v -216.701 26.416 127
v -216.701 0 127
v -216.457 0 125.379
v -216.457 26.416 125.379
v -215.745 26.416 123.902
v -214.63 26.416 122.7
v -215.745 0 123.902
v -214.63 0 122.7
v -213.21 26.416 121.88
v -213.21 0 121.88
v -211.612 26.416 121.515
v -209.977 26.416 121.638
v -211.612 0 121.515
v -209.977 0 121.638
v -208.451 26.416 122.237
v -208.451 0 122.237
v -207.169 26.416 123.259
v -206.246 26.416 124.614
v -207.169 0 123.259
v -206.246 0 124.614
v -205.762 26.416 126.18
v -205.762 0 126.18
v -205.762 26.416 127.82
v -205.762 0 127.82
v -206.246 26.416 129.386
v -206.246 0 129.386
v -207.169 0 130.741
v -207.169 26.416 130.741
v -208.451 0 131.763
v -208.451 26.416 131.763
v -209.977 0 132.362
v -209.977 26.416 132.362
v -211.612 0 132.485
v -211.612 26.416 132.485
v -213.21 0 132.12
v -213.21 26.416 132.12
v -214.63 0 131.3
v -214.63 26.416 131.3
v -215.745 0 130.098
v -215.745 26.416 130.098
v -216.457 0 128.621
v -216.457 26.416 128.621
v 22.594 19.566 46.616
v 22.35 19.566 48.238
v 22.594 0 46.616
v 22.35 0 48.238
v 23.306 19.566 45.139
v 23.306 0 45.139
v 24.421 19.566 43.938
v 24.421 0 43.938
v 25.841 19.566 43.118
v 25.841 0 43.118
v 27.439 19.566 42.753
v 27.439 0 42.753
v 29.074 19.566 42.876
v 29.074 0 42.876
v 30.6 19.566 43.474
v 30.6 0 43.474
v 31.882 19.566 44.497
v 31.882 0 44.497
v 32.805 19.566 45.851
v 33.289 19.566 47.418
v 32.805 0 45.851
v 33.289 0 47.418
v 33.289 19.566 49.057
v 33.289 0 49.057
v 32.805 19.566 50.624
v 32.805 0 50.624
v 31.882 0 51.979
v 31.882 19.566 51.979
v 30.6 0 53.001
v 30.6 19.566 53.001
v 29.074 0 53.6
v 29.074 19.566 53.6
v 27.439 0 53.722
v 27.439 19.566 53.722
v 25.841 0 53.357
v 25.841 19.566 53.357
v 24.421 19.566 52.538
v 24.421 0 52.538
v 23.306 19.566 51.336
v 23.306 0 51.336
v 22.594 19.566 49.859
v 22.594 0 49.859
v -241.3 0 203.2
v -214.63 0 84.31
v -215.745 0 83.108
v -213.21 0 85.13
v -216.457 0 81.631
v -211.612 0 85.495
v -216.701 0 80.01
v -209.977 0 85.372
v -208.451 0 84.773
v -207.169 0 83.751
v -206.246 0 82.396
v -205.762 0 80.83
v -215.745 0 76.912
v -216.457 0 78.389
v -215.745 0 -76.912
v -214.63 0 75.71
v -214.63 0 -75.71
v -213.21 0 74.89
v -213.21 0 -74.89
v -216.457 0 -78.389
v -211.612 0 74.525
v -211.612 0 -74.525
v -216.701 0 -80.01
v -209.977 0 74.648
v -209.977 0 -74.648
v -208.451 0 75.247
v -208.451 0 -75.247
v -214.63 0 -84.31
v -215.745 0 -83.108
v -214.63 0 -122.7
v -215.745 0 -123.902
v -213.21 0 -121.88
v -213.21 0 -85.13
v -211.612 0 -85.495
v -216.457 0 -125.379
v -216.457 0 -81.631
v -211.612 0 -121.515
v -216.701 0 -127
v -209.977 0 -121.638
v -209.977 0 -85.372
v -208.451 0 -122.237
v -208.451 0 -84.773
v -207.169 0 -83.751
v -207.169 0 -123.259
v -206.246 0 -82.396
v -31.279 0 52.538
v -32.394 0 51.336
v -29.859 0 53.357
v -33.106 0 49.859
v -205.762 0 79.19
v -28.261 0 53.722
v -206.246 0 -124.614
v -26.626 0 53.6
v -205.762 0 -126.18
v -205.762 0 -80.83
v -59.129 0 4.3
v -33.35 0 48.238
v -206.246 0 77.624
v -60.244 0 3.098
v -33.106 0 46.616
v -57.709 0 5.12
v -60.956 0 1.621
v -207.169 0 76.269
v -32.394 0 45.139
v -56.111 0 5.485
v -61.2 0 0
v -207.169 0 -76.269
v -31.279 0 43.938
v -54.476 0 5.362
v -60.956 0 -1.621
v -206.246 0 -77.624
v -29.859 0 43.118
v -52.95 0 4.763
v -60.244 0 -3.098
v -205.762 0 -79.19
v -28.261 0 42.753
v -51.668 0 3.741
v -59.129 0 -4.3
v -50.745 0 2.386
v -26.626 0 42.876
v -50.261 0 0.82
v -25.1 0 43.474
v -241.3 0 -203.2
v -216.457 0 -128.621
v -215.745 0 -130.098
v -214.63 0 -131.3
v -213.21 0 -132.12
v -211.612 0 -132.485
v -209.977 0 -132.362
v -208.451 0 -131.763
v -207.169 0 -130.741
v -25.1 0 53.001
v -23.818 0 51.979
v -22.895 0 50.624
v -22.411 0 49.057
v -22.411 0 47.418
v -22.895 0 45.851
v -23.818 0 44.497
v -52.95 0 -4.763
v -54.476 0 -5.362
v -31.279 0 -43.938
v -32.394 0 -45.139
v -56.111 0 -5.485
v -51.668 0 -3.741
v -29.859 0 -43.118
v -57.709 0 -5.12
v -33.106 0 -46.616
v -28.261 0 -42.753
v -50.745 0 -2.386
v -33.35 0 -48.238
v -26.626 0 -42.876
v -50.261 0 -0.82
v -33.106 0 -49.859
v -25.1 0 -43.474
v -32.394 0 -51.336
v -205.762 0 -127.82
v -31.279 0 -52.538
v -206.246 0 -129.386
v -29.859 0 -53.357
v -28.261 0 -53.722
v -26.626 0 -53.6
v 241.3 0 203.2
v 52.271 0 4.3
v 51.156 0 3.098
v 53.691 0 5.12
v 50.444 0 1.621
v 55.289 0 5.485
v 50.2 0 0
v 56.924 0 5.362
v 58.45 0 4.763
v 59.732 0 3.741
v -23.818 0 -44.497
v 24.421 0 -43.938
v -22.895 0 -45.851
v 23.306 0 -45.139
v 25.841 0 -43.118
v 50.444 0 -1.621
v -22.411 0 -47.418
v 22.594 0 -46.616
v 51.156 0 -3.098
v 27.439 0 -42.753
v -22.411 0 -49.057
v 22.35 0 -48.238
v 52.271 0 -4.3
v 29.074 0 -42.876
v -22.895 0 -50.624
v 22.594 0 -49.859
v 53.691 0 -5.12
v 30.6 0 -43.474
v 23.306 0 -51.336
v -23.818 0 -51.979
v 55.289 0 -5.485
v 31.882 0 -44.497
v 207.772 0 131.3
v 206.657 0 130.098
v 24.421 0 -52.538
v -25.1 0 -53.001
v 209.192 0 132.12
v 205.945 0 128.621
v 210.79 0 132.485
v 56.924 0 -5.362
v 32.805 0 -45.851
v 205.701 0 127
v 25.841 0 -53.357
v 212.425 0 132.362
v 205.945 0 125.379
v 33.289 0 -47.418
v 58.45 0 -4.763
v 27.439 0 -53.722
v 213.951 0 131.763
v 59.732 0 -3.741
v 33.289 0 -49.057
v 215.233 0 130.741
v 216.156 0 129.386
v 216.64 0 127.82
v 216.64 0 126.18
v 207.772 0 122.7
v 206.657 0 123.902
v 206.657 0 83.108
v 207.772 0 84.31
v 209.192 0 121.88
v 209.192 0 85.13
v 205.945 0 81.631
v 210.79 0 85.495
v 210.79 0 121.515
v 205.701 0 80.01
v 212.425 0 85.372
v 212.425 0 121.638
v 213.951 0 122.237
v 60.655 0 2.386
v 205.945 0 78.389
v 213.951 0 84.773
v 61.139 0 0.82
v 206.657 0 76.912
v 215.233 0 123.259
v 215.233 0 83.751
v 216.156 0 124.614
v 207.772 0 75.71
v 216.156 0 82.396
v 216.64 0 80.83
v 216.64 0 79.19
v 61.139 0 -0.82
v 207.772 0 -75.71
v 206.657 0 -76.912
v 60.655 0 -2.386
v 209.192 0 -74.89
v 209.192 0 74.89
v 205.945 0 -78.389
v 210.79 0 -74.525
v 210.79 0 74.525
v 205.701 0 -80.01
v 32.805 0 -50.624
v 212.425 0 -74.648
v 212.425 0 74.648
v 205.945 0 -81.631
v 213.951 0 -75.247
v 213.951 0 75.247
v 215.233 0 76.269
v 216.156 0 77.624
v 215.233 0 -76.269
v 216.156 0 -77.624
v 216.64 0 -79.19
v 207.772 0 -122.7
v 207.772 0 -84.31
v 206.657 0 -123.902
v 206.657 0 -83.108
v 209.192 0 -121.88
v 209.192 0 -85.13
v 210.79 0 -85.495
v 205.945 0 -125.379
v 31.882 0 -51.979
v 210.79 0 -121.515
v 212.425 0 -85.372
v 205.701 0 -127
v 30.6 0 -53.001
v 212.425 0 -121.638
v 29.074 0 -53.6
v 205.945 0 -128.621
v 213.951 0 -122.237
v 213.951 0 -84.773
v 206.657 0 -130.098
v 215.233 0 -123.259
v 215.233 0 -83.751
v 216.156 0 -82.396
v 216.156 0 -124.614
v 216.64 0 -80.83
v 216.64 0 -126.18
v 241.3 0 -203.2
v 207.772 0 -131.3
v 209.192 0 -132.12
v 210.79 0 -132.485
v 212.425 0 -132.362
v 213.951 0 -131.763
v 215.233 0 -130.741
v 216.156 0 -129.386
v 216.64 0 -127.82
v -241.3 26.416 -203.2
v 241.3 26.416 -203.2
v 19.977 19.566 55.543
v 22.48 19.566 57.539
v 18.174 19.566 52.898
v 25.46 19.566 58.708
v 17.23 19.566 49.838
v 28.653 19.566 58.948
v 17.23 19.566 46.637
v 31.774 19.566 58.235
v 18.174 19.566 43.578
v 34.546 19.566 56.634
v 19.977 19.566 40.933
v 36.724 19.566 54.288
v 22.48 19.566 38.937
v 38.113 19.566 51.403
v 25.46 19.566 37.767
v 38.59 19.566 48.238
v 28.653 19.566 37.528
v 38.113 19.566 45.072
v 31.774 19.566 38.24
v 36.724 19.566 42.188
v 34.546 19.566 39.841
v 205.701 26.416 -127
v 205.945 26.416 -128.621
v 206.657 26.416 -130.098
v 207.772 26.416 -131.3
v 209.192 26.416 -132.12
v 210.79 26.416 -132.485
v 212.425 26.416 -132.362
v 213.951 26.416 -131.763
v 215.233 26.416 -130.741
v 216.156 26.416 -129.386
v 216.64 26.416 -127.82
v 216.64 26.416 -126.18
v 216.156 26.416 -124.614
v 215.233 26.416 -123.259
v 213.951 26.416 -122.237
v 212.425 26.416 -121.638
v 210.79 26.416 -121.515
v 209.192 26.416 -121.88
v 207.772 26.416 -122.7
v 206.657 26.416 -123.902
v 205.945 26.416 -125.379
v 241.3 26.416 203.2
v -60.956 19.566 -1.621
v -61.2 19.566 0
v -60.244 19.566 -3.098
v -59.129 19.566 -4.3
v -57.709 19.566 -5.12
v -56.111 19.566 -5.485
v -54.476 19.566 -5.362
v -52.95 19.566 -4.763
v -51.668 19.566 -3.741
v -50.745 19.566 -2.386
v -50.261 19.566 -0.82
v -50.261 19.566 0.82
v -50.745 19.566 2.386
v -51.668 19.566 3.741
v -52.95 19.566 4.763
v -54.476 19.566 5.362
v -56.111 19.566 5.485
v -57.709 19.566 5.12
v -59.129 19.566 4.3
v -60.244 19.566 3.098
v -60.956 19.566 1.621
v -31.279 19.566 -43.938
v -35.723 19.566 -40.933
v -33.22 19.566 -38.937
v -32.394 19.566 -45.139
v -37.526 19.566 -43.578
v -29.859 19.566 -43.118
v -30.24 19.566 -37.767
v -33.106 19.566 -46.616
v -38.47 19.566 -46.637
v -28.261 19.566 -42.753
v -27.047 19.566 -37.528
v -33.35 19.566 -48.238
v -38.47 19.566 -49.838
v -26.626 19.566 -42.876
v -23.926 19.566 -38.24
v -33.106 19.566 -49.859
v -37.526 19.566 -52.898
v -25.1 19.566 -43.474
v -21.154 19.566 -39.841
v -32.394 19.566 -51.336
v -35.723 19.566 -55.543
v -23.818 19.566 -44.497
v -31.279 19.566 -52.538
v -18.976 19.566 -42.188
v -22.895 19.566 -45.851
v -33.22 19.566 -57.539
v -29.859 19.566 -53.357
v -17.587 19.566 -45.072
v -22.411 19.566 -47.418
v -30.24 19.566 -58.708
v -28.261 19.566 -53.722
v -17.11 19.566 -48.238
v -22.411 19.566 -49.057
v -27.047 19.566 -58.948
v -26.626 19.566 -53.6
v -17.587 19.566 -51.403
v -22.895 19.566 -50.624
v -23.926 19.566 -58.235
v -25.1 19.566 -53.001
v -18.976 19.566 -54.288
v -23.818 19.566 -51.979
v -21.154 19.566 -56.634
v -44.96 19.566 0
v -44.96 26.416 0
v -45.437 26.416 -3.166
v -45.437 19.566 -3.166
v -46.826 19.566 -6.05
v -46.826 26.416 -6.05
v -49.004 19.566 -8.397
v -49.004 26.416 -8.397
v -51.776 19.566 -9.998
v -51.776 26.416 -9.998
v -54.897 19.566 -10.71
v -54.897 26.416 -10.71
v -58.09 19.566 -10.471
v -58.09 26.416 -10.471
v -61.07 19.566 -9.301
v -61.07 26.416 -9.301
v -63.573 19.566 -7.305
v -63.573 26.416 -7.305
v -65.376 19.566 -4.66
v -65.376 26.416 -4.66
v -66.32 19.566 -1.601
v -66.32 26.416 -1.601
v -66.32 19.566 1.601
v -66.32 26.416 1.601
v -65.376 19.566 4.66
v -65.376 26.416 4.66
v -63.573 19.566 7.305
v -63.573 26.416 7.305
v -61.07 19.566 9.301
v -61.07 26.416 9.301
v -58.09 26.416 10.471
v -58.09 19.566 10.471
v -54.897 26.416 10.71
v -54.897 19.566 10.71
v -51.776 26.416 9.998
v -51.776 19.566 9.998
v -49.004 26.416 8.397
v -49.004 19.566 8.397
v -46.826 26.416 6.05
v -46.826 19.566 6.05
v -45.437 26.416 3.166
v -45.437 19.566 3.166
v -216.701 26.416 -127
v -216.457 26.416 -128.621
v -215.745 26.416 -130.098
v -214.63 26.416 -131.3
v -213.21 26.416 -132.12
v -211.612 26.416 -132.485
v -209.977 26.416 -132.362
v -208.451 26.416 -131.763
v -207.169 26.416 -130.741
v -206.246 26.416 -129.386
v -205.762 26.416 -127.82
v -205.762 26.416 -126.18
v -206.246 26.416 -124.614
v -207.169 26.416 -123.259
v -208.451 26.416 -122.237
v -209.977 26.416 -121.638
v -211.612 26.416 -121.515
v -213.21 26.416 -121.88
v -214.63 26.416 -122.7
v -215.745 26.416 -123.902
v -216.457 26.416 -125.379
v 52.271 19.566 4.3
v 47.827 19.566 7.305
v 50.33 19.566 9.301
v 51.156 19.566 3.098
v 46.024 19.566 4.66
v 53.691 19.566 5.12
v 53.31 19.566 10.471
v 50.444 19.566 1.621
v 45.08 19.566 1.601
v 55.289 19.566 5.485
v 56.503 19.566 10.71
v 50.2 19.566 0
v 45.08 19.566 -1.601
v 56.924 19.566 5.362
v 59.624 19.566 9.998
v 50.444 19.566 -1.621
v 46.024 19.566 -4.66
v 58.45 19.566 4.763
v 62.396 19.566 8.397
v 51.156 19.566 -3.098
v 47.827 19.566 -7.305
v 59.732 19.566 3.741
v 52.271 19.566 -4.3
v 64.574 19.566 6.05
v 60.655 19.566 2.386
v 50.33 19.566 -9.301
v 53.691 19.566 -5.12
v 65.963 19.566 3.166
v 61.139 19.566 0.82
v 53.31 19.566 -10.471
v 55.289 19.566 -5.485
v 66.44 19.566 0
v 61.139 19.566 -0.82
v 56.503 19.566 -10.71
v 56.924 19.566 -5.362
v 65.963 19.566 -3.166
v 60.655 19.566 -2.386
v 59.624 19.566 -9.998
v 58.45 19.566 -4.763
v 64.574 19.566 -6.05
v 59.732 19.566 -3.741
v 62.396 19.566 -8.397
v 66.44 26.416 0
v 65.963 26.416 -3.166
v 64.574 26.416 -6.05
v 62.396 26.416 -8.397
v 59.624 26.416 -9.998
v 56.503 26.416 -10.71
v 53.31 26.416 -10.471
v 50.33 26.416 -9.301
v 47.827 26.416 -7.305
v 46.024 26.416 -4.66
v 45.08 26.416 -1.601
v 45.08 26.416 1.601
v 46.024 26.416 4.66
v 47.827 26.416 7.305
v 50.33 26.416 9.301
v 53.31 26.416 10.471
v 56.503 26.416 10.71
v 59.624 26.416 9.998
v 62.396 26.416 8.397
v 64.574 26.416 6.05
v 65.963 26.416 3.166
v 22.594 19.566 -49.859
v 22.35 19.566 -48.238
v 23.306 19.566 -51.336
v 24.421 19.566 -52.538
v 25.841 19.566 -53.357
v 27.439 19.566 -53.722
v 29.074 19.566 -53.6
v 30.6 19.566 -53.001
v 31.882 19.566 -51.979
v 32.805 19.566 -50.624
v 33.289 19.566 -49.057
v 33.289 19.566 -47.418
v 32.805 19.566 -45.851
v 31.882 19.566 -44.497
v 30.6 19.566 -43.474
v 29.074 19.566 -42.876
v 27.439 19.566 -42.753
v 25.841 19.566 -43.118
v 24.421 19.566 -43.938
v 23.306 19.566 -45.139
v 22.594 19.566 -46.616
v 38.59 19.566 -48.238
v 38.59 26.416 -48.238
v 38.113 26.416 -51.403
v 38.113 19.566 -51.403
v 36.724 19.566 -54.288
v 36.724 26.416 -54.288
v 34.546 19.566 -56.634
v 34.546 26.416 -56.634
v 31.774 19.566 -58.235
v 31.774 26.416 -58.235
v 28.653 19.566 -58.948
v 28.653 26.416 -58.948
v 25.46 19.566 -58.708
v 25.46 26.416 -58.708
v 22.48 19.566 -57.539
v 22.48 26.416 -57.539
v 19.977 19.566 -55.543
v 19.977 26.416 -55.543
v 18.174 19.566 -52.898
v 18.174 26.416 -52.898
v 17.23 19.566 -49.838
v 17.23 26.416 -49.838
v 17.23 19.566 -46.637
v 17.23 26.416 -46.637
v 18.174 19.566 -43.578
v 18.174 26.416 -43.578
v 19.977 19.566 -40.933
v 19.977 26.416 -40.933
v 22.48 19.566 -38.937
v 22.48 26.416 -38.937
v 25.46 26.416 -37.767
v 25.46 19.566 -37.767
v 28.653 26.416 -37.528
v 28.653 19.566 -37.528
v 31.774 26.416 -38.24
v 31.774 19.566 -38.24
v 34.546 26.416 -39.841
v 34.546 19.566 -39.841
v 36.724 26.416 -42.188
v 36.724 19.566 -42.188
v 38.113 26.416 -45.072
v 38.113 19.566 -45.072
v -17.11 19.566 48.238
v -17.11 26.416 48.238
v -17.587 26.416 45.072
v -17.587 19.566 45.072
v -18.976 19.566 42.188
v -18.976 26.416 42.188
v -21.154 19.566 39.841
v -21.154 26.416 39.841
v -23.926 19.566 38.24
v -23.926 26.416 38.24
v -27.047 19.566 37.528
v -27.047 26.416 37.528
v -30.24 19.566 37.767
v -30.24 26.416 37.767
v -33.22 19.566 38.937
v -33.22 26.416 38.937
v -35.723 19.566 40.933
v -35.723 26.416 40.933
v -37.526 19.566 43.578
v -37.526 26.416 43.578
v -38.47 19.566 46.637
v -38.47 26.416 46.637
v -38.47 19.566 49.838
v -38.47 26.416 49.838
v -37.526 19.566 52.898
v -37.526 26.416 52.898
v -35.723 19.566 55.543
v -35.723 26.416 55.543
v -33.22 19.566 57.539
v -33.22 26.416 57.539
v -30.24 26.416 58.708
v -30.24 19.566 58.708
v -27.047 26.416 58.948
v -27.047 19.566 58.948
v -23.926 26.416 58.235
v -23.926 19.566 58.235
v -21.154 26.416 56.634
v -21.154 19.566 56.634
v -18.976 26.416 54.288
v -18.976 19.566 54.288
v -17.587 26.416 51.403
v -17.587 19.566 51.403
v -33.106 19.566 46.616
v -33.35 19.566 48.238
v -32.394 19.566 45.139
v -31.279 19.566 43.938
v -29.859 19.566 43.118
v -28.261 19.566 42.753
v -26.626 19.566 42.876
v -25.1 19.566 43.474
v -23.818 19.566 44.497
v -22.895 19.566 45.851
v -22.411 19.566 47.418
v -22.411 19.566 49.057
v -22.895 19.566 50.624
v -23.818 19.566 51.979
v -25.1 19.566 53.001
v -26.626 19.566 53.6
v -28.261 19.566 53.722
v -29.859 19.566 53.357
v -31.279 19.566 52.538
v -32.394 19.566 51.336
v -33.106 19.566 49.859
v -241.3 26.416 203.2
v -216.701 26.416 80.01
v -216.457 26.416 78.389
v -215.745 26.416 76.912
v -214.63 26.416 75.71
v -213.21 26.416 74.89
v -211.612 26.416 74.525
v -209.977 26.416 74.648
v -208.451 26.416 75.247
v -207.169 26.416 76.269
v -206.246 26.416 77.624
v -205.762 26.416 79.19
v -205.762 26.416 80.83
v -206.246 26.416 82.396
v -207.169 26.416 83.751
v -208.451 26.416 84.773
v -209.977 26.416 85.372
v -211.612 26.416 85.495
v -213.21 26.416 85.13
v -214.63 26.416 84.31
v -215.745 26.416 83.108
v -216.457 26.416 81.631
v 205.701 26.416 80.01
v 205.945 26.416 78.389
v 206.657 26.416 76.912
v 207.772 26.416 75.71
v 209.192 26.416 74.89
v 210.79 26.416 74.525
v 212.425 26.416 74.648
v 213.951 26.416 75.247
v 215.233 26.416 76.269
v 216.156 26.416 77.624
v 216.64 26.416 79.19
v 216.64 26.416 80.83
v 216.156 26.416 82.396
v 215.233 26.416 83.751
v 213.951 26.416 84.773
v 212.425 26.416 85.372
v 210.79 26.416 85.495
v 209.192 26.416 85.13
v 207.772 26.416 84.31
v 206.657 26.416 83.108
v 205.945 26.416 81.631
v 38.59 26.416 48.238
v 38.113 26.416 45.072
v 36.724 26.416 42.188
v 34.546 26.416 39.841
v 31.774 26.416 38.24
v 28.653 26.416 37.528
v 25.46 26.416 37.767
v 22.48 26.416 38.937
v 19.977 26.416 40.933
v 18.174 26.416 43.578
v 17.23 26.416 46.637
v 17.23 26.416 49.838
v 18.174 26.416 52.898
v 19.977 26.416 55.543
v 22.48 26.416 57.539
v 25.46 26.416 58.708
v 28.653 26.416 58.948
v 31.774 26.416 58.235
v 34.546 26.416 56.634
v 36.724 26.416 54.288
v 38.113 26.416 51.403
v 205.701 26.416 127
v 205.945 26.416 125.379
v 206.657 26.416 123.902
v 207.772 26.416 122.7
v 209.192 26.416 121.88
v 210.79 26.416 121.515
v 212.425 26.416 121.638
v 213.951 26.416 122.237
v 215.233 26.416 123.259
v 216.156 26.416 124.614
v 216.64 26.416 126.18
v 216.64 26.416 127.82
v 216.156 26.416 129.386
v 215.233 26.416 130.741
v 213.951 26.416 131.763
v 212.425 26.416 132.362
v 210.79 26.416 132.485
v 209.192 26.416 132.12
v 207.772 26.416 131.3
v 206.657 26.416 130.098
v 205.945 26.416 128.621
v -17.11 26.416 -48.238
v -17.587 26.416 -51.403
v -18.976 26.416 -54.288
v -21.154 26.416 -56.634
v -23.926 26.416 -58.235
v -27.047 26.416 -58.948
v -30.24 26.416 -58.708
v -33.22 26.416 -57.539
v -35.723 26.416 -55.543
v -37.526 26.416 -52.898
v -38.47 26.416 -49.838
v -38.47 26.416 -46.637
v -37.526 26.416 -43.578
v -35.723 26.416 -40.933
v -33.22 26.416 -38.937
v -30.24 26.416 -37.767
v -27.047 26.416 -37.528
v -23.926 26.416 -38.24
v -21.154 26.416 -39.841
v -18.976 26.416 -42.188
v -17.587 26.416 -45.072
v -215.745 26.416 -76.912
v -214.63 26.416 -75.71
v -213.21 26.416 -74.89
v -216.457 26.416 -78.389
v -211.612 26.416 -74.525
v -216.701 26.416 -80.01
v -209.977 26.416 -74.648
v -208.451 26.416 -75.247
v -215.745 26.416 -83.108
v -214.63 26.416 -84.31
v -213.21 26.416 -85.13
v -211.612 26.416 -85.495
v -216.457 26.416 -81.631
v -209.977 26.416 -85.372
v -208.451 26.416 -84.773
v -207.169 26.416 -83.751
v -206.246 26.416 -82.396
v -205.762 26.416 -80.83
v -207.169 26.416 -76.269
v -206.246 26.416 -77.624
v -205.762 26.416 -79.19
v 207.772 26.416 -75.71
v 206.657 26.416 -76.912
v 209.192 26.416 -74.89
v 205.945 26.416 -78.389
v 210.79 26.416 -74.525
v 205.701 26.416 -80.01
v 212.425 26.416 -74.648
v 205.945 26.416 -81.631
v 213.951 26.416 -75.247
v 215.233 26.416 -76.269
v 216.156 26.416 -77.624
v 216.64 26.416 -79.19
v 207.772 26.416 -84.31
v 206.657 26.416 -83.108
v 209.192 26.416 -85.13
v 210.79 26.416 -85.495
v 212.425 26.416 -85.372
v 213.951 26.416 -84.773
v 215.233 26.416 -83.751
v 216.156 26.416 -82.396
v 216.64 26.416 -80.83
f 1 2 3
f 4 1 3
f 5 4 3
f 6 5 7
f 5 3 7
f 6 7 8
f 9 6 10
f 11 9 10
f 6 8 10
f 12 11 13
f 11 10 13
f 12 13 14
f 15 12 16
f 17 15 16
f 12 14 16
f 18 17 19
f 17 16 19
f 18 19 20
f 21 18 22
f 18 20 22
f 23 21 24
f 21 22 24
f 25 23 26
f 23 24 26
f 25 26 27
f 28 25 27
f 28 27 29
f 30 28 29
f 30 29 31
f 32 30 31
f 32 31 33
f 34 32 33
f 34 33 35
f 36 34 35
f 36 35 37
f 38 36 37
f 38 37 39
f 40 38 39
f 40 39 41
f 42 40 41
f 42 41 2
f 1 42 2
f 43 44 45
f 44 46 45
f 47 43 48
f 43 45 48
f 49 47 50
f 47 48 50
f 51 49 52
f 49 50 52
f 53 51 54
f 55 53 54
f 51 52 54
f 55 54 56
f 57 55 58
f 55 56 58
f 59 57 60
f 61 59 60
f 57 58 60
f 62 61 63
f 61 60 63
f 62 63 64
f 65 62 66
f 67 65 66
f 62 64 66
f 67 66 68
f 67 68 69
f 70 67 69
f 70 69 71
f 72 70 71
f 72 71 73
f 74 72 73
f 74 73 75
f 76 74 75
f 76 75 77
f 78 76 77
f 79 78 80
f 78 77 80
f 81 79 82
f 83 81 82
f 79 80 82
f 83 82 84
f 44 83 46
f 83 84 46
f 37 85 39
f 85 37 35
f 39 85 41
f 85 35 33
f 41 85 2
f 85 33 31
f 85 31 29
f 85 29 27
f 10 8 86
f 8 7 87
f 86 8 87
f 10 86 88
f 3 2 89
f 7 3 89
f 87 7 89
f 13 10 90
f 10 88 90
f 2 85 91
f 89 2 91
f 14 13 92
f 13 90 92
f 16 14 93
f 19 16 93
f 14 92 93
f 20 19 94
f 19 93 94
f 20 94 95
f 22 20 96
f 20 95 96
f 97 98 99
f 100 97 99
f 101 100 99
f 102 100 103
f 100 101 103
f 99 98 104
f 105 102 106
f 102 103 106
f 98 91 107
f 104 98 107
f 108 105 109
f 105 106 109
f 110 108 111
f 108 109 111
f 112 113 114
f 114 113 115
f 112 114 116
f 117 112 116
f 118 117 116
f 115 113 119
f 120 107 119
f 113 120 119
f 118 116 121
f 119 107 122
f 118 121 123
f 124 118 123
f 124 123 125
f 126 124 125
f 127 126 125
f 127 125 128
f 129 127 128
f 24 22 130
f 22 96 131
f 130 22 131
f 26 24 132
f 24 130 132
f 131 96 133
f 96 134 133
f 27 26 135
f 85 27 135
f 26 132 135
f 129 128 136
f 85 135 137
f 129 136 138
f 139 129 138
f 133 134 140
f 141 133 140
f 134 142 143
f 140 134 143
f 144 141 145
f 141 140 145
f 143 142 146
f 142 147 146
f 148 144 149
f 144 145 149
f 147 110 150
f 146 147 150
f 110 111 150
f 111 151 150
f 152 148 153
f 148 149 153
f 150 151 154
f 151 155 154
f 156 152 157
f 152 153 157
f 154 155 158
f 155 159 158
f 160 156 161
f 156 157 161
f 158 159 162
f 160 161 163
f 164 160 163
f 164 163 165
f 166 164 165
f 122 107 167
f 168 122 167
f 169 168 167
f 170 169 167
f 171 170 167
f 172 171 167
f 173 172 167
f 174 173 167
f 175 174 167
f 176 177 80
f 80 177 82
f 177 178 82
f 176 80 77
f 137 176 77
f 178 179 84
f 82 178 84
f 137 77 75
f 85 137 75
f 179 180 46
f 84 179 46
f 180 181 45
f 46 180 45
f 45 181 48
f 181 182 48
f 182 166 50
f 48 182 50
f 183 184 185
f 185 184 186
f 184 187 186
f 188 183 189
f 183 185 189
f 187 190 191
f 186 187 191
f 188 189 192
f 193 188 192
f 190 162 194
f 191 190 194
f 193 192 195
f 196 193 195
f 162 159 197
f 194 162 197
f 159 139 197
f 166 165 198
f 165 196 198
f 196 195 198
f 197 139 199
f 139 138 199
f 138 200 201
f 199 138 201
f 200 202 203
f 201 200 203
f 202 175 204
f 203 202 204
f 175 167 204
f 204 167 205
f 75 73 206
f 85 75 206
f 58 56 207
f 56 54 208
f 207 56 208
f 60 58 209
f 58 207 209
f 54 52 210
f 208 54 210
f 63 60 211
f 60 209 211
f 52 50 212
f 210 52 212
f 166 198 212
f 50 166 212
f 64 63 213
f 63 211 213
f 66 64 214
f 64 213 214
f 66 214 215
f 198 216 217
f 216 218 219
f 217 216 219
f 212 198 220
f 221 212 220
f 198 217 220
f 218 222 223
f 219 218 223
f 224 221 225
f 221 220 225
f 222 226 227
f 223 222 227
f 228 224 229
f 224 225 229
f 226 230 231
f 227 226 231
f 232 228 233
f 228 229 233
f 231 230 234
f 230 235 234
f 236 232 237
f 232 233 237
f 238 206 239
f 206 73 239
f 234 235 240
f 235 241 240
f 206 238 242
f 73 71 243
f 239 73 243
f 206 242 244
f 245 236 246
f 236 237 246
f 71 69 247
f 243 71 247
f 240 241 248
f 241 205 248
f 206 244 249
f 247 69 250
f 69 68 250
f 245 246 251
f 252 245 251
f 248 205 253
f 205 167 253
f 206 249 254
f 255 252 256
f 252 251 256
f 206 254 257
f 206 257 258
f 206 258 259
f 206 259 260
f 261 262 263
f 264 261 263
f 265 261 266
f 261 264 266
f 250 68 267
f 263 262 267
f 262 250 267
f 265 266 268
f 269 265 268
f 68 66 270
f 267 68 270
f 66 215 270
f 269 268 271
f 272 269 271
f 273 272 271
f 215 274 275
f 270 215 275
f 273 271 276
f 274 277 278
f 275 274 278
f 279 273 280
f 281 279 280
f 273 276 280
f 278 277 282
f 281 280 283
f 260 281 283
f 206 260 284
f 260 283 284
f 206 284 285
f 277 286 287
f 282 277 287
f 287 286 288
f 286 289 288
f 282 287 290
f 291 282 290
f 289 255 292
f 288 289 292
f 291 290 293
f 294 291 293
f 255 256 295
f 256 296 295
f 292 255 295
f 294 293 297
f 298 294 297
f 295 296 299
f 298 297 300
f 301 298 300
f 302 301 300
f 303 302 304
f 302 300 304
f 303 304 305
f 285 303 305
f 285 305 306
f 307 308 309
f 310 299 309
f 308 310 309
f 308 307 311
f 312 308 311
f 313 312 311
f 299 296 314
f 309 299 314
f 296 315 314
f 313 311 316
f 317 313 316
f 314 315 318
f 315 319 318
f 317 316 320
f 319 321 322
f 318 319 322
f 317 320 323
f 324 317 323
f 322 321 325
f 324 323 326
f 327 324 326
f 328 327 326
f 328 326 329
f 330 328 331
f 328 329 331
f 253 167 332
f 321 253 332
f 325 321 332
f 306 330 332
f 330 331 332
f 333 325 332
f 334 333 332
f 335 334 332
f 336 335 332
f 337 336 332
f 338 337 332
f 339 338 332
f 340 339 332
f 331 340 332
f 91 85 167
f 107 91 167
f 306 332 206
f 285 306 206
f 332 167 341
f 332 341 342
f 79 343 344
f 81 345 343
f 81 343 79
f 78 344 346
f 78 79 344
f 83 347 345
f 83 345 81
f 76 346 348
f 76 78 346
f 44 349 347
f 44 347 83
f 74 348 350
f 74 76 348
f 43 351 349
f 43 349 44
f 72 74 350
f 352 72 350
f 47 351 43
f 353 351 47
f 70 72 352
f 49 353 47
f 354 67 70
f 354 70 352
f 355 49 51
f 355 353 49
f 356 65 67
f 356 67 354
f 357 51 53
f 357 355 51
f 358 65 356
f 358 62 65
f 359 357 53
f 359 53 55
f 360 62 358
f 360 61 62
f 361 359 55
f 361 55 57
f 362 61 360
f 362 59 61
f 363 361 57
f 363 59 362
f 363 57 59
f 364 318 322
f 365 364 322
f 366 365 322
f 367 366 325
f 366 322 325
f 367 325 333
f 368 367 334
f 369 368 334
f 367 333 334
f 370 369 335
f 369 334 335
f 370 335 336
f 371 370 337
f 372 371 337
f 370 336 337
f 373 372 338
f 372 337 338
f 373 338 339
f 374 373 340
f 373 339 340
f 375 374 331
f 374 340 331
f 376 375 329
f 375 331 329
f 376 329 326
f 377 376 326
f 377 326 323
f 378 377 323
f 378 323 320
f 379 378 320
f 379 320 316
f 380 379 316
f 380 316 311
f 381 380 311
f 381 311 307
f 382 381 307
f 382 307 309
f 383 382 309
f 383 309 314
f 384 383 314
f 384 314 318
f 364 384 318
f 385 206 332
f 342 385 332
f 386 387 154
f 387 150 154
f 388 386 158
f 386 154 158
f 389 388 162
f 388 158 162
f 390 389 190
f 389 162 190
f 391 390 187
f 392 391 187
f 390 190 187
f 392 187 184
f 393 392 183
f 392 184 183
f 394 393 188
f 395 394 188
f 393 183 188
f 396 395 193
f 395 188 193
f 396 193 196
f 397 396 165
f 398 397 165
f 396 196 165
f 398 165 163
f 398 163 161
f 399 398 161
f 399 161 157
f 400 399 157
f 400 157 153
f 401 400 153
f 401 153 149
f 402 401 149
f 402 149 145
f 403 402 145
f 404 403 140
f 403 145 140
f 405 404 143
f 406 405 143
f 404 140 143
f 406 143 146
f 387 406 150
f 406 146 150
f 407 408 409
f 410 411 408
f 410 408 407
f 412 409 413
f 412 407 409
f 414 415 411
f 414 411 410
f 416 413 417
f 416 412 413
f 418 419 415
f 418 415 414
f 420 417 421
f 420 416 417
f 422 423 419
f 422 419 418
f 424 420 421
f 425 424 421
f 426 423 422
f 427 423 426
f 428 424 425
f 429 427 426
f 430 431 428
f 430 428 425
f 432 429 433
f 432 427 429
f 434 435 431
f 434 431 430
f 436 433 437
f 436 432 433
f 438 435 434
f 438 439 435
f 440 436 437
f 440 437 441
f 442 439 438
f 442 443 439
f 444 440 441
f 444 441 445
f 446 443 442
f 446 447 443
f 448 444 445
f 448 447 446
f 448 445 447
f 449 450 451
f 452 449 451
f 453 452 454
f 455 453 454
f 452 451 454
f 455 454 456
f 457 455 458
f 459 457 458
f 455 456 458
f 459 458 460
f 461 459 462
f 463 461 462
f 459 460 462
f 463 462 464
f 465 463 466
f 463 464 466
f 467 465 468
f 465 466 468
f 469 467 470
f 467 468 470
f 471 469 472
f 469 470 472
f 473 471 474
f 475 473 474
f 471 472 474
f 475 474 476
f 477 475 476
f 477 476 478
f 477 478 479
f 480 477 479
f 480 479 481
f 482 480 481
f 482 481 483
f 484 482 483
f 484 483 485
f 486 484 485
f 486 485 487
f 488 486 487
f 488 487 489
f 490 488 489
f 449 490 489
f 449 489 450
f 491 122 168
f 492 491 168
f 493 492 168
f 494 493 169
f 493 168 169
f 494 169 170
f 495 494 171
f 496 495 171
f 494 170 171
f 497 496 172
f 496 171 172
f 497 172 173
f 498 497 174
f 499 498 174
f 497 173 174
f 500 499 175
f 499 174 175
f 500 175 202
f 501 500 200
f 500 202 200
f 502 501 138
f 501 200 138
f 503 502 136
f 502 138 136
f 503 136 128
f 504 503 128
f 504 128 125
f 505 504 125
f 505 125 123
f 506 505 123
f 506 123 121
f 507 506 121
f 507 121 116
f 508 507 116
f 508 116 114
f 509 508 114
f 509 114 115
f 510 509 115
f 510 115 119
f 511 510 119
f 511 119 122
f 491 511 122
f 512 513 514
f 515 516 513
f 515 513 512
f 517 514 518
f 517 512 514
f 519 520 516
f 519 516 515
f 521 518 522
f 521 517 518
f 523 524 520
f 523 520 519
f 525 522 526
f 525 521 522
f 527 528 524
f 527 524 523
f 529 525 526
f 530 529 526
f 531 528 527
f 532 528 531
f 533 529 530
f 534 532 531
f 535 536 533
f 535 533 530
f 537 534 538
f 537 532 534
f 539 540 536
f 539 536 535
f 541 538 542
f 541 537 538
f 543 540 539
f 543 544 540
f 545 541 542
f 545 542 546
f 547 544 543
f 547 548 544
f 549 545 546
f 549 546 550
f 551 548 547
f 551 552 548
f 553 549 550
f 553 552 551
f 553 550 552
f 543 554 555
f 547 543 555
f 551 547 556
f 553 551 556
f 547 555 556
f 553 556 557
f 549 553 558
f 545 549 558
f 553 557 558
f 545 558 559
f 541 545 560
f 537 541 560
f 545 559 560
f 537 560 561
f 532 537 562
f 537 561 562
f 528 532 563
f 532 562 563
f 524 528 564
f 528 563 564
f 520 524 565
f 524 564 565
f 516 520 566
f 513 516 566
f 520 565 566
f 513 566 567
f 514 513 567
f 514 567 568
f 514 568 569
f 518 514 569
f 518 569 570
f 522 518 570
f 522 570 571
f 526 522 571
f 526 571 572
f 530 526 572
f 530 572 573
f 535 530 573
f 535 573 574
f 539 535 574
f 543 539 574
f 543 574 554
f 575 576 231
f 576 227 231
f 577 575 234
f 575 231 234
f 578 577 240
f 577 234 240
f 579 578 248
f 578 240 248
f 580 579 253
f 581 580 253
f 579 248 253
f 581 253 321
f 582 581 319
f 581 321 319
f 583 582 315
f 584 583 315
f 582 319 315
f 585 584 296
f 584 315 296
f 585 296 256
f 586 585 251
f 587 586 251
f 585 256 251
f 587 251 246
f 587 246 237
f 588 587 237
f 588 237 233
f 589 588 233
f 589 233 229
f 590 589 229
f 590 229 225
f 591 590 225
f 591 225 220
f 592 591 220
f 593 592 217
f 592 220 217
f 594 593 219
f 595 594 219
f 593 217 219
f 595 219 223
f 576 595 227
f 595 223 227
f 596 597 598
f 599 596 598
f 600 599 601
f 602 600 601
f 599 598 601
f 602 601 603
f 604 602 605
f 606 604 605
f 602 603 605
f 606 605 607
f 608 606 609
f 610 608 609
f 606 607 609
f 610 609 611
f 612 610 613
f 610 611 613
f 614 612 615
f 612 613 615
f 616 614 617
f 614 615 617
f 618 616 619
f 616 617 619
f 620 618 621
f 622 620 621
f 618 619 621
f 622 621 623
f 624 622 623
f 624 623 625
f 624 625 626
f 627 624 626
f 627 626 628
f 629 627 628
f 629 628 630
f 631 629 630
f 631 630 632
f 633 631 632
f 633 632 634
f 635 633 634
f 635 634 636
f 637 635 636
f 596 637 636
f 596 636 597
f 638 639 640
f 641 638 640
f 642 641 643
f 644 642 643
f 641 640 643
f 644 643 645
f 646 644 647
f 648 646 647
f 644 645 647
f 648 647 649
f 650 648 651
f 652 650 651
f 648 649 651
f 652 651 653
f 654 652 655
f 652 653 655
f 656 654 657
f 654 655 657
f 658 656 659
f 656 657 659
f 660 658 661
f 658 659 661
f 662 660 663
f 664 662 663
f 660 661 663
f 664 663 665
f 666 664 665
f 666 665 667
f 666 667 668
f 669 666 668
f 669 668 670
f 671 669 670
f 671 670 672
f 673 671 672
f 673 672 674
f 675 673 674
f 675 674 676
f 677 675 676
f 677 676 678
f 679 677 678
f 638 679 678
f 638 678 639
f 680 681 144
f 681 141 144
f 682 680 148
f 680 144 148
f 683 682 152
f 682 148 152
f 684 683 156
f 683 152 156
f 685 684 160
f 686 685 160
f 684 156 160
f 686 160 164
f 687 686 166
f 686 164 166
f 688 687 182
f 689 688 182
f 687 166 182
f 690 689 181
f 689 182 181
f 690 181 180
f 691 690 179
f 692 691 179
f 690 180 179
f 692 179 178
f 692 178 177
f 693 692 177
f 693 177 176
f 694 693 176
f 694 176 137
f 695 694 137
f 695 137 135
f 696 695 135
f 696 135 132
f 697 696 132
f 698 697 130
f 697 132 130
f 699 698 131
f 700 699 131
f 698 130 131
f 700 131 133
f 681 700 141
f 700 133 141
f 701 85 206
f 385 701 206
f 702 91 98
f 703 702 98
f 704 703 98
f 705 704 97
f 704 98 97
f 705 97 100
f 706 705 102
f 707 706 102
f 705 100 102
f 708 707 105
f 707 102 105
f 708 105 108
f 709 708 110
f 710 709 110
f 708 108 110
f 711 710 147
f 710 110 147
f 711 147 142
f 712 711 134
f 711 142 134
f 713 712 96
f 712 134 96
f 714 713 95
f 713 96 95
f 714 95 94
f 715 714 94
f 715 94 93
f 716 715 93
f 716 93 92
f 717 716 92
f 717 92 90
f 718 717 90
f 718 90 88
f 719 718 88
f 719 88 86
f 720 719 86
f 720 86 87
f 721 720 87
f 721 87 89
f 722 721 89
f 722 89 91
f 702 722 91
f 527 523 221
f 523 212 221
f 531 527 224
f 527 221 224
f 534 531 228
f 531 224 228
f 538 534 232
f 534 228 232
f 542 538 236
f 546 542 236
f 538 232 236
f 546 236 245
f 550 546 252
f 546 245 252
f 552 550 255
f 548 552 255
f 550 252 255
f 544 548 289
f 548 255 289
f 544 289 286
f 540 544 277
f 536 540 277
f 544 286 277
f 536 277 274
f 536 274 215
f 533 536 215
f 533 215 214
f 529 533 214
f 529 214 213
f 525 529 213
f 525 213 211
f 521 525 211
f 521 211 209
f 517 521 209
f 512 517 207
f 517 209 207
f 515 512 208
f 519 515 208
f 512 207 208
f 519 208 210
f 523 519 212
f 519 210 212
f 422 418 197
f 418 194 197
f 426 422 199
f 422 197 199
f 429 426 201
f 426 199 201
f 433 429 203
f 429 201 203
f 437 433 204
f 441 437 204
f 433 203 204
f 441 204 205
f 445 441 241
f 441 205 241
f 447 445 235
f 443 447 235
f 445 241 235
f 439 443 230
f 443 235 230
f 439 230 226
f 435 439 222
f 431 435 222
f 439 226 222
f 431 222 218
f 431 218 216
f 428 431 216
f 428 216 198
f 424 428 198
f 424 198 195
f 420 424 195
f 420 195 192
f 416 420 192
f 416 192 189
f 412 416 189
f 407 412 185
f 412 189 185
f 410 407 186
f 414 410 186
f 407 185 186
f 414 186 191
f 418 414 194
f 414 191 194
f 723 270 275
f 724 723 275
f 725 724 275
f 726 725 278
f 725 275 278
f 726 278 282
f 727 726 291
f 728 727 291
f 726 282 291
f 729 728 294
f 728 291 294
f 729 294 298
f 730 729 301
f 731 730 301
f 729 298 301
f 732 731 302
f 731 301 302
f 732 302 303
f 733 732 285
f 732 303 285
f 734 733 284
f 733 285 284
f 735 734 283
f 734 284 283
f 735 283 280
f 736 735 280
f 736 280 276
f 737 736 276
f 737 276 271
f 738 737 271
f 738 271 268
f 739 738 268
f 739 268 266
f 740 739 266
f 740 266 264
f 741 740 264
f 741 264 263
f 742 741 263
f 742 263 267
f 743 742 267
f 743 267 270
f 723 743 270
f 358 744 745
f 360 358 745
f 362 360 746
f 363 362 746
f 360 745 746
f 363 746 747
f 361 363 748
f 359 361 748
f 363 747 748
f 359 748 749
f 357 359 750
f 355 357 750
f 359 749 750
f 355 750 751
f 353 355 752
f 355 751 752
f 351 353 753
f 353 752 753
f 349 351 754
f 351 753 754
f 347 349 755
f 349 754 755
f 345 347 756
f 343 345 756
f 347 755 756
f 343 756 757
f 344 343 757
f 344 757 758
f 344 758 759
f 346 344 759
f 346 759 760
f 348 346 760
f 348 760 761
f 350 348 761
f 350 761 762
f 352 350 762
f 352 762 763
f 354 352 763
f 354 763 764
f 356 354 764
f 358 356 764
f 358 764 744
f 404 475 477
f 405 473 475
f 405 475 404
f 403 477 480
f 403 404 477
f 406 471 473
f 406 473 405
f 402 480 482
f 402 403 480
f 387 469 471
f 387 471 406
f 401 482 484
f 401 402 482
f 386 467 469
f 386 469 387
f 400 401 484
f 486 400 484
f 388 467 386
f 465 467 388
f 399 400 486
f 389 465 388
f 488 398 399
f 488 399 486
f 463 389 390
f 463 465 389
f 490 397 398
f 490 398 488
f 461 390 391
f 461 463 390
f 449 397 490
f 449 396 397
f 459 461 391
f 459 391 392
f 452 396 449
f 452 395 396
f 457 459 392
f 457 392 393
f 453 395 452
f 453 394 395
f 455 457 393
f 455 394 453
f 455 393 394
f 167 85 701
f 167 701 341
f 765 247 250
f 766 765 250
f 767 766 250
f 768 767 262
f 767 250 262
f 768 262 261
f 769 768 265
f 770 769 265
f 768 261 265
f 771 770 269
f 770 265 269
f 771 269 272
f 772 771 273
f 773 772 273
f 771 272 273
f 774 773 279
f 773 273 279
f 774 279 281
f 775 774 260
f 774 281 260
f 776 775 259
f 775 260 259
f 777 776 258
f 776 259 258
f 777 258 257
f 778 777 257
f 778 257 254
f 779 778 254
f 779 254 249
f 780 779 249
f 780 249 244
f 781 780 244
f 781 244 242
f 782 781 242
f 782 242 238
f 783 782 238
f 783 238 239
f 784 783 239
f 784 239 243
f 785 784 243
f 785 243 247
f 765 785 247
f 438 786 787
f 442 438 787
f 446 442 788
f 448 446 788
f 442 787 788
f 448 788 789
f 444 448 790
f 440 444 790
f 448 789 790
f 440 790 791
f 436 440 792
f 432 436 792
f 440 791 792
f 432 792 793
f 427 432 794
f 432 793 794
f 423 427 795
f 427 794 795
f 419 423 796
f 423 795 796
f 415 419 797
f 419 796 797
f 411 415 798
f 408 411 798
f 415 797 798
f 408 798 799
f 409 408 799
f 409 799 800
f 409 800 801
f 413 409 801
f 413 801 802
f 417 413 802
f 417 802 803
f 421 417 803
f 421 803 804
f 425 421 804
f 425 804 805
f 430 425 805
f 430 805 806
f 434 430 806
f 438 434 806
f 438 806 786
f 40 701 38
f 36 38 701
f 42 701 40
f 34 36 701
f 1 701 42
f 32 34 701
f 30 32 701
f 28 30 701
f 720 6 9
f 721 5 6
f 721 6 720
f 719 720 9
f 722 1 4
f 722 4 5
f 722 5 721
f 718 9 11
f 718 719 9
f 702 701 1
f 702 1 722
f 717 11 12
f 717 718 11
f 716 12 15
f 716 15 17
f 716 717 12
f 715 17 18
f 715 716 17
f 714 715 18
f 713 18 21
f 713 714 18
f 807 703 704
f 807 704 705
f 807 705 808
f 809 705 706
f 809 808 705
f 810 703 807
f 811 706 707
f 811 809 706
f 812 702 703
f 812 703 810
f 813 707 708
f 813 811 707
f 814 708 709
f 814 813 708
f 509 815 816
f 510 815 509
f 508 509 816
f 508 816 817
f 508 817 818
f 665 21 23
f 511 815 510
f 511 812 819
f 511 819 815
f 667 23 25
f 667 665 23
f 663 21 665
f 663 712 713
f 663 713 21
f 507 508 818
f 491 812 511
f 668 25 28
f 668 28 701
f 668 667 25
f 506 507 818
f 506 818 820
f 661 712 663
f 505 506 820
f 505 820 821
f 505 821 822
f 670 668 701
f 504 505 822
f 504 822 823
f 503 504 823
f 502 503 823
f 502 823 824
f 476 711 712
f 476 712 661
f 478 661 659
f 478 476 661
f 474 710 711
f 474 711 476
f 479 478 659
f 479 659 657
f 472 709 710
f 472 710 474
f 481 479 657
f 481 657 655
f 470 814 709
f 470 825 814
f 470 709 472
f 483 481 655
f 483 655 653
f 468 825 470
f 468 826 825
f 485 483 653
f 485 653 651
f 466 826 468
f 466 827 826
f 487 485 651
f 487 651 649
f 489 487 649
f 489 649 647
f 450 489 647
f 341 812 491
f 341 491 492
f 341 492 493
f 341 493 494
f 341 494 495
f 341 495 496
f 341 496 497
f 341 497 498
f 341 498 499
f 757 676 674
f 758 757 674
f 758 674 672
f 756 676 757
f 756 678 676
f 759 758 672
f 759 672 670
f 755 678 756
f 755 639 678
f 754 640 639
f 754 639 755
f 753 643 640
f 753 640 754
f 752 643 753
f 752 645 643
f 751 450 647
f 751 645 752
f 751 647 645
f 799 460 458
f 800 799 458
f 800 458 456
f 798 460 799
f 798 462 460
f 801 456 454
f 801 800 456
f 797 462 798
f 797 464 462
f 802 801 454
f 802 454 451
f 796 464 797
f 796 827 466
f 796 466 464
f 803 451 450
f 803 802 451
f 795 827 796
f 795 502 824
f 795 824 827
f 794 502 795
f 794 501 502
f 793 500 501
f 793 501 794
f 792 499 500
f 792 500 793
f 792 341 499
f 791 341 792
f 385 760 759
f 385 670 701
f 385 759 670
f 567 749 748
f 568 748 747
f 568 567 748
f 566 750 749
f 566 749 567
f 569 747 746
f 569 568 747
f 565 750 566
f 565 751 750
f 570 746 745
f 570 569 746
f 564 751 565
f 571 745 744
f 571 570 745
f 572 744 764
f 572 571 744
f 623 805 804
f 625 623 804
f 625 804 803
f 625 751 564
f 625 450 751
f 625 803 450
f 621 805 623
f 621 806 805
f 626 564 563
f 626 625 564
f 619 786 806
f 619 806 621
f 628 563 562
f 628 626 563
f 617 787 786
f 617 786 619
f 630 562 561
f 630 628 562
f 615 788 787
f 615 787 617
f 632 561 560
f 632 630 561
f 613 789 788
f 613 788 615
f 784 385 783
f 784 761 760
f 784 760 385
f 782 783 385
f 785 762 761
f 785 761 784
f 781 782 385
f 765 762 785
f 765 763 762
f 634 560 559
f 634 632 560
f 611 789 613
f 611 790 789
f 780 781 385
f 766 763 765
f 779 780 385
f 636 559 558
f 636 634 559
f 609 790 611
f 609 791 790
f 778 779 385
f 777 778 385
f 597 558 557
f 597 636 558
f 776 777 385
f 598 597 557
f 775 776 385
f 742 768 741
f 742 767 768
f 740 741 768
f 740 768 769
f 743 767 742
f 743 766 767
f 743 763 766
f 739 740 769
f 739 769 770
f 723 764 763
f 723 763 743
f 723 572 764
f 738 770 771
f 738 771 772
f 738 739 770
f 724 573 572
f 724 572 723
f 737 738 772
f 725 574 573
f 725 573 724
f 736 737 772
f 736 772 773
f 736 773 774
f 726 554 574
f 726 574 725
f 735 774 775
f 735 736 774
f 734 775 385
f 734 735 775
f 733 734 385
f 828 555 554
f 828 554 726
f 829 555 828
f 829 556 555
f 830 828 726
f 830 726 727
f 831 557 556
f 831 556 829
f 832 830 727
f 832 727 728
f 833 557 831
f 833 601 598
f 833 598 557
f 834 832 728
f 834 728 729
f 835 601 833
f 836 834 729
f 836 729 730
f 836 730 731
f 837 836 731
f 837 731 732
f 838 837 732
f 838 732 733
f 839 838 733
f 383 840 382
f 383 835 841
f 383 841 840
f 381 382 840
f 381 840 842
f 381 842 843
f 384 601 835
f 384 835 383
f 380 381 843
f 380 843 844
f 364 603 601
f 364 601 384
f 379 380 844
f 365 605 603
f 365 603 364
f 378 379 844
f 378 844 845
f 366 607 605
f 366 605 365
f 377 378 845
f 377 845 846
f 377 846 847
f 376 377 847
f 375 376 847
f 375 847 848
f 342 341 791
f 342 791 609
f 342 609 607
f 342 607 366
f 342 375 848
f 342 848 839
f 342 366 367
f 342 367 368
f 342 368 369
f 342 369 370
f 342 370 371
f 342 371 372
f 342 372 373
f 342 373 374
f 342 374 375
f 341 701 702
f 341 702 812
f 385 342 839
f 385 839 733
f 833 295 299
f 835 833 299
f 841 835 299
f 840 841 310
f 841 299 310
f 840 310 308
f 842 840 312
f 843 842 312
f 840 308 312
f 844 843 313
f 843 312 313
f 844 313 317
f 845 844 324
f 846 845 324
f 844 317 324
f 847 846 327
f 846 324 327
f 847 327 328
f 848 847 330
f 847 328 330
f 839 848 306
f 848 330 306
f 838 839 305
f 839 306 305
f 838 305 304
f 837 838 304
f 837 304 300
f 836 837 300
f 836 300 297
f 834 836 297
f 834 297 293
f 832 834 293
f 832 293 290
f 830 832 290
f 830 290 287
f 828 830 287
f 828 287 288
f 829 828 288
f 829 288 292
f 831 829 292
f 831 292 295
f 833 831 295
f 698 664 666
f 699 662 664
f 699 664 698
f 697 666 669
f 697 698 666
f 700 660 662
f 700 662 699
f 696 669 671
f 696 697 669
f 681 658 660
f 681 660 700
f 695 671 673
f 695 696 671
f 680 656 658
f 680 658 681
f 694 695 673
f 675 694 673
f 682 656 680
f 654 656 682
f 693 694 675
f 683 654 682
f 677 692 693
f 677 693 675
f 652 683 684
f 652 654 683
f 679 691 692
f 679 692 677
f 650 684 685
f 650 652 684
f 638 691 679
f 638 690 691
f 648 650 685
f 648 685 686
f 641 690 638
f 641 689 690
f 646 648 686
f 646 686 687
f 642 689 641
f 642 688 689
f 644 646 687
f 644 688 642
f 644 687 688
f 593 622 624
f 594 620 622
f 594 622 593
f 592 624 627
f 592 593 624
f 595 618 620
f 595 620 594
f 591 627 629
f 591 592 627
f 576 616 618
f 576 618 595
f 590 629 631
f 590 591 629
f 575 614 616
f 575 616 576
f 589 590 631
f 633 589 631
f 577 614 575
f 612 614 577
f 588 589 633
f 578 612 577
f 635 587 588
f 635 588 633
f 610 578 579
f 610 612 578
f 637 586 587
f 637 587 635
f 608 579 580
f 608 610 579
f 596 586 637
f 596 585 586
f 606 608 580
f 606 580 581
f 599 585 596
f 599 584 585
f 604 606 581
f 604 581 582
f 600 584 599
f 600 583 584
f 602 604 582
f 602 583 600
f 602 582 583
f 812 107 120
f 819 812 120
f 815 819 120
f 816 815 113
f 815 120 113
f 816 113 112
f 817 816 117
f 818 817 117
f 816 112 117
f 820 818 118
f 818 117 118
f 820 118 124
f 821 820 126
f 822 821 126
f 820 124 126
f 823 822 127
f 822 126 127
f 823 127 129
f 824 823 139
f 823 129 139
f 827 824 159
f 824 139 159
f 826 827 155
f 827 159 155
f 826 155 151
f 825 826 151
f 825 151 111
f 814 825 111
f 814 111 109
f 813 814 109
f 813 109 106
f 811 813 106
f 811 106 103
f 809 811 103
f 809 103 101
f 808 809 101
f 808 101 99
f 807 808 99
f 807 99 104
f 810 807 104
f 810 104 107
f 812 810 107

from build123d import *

# Parameters (mm, degrees)
SKETCH1_W                                = 482.6
SKETCH1_H                                = 406.4
BOSS_EXTRUDE1_DEPTH                      = 26.416
SKETCH3_R                                = 1.27
SKETCH3_R_2                              = 5.25
CUT_EXTRUDE2_DEPTH                       = 27.416
CBORE_FOR_M10_HEX_HEAD_BOLT1_D           = 11
CBORE_FOR_M10_HEX_HEAD_BOLT1_CBORE_D     = 21.48
CBORE_FOR_M10_HEX_HEAD_BOLT1_CBORE_DEPTH = 6.85
M10_CLEARANCE_HOLE1_D                    = 11


with BuildPart() as part:
    # Sketch1 → Boss-Extrude1 (new body)
    with BuildSketch(Plane(origin=(0, 0, 0), x_dir=(1, 0, 0), z_dir=(0, 1, 0))):
        Rectangle(SKETCH1_W, SKETCH1_H)
    extrude(amount=BOSS_EXTRUDE1_DEPTH)

    # Sketch3 → Cut-Extrude2 (cut, through all)
    with BuildSketch(Plane(origin=(0, 26.416, 0), x_dir=(1, 0, 0), z_dir=(0, 1, 0))):
        with Locations((-211.201, -80.01)):
            Circle(SKETCH3_R)
        with Locations((-211.201, 80.01)):
            Circle(SKETCH3_R)
        with Locations((211.201, -80.01)):
            Circle(SKETCH3_R)
        with Locations((211.201, 80.01)):
            Circle(SKETCH3_R)
        with Locations((55.7, 0)):
            Circle(SKETCH3_R_2)
        with Locations((27.85, -48.237614991)):
            Circle(SKETCH3_R_2)
        with Locations((-27.85, -48.237614991)):
            Circle(SKETCH3_R_2)
        with Locations((-55.7, 0)):
            Circle(SKETCH3_R_2)
        with Locations((-27.85, 48.237614991)):
            Circle(SKETCH3_R_2)
        with Locations((27.85, 48.237614991)):
            Circle(SKETCH3_R_2)
        with Locations((-211.201, -127)):
            Circle(SKETCH3_R)
        with Locations((211.201, -127)):
            Circle(SKETCH3_R)
        with Locations((211.201, 127)):
            Circle(SKETCH3_R)
        with Locations((-211.201, 127)):
            Circle(SKETCH3_R)
    extrude(amount=-CUT_EXTRUDE2_DEPTH, mode=Mode.SUBTRACT)

    # CBORE for M10 Hex Head Bolt1 (through all)
    with Locations(Plane(origin=(0, 26.416, 0), x_dir=(1, 0, 0), z_dir=(0, 1, 0))):
        with Locations((27.85, 48.237614991), (55.7, 0), (27.85, -48.237614991), (-27.85, -48.237614991), (-55.7, 0), (-27.85, 48.237614991)):
            CounterBoreHole(CBORE_FOR_M10_HEX_HEAD_BOLT1_D / 2, CBORE_FOR_M10_HEX_HEAD_BOLT1_CBORE_D / 2, CBORE_FOR_M10_HEX_HEAD_BOLT1_CBORE_DEPTH)

    # M10 Clearance Hole1 (through all)
    with Locations(Plane(origin=(0, 26.416, 0), x_dir=(1, 0, 0), z_dir=(0, 1, 0))):
        with Locations((-211.201, 127), (-211.201, 80.01), (-211.201, -80.01), (-211.201, -127), (211.201, -127), (211.201, -80.01), (211.201, 80.01), (211.201, 127)):
            Hole(M10_CLEARANCE_HOLE1_D / 2)


solid = part.part
